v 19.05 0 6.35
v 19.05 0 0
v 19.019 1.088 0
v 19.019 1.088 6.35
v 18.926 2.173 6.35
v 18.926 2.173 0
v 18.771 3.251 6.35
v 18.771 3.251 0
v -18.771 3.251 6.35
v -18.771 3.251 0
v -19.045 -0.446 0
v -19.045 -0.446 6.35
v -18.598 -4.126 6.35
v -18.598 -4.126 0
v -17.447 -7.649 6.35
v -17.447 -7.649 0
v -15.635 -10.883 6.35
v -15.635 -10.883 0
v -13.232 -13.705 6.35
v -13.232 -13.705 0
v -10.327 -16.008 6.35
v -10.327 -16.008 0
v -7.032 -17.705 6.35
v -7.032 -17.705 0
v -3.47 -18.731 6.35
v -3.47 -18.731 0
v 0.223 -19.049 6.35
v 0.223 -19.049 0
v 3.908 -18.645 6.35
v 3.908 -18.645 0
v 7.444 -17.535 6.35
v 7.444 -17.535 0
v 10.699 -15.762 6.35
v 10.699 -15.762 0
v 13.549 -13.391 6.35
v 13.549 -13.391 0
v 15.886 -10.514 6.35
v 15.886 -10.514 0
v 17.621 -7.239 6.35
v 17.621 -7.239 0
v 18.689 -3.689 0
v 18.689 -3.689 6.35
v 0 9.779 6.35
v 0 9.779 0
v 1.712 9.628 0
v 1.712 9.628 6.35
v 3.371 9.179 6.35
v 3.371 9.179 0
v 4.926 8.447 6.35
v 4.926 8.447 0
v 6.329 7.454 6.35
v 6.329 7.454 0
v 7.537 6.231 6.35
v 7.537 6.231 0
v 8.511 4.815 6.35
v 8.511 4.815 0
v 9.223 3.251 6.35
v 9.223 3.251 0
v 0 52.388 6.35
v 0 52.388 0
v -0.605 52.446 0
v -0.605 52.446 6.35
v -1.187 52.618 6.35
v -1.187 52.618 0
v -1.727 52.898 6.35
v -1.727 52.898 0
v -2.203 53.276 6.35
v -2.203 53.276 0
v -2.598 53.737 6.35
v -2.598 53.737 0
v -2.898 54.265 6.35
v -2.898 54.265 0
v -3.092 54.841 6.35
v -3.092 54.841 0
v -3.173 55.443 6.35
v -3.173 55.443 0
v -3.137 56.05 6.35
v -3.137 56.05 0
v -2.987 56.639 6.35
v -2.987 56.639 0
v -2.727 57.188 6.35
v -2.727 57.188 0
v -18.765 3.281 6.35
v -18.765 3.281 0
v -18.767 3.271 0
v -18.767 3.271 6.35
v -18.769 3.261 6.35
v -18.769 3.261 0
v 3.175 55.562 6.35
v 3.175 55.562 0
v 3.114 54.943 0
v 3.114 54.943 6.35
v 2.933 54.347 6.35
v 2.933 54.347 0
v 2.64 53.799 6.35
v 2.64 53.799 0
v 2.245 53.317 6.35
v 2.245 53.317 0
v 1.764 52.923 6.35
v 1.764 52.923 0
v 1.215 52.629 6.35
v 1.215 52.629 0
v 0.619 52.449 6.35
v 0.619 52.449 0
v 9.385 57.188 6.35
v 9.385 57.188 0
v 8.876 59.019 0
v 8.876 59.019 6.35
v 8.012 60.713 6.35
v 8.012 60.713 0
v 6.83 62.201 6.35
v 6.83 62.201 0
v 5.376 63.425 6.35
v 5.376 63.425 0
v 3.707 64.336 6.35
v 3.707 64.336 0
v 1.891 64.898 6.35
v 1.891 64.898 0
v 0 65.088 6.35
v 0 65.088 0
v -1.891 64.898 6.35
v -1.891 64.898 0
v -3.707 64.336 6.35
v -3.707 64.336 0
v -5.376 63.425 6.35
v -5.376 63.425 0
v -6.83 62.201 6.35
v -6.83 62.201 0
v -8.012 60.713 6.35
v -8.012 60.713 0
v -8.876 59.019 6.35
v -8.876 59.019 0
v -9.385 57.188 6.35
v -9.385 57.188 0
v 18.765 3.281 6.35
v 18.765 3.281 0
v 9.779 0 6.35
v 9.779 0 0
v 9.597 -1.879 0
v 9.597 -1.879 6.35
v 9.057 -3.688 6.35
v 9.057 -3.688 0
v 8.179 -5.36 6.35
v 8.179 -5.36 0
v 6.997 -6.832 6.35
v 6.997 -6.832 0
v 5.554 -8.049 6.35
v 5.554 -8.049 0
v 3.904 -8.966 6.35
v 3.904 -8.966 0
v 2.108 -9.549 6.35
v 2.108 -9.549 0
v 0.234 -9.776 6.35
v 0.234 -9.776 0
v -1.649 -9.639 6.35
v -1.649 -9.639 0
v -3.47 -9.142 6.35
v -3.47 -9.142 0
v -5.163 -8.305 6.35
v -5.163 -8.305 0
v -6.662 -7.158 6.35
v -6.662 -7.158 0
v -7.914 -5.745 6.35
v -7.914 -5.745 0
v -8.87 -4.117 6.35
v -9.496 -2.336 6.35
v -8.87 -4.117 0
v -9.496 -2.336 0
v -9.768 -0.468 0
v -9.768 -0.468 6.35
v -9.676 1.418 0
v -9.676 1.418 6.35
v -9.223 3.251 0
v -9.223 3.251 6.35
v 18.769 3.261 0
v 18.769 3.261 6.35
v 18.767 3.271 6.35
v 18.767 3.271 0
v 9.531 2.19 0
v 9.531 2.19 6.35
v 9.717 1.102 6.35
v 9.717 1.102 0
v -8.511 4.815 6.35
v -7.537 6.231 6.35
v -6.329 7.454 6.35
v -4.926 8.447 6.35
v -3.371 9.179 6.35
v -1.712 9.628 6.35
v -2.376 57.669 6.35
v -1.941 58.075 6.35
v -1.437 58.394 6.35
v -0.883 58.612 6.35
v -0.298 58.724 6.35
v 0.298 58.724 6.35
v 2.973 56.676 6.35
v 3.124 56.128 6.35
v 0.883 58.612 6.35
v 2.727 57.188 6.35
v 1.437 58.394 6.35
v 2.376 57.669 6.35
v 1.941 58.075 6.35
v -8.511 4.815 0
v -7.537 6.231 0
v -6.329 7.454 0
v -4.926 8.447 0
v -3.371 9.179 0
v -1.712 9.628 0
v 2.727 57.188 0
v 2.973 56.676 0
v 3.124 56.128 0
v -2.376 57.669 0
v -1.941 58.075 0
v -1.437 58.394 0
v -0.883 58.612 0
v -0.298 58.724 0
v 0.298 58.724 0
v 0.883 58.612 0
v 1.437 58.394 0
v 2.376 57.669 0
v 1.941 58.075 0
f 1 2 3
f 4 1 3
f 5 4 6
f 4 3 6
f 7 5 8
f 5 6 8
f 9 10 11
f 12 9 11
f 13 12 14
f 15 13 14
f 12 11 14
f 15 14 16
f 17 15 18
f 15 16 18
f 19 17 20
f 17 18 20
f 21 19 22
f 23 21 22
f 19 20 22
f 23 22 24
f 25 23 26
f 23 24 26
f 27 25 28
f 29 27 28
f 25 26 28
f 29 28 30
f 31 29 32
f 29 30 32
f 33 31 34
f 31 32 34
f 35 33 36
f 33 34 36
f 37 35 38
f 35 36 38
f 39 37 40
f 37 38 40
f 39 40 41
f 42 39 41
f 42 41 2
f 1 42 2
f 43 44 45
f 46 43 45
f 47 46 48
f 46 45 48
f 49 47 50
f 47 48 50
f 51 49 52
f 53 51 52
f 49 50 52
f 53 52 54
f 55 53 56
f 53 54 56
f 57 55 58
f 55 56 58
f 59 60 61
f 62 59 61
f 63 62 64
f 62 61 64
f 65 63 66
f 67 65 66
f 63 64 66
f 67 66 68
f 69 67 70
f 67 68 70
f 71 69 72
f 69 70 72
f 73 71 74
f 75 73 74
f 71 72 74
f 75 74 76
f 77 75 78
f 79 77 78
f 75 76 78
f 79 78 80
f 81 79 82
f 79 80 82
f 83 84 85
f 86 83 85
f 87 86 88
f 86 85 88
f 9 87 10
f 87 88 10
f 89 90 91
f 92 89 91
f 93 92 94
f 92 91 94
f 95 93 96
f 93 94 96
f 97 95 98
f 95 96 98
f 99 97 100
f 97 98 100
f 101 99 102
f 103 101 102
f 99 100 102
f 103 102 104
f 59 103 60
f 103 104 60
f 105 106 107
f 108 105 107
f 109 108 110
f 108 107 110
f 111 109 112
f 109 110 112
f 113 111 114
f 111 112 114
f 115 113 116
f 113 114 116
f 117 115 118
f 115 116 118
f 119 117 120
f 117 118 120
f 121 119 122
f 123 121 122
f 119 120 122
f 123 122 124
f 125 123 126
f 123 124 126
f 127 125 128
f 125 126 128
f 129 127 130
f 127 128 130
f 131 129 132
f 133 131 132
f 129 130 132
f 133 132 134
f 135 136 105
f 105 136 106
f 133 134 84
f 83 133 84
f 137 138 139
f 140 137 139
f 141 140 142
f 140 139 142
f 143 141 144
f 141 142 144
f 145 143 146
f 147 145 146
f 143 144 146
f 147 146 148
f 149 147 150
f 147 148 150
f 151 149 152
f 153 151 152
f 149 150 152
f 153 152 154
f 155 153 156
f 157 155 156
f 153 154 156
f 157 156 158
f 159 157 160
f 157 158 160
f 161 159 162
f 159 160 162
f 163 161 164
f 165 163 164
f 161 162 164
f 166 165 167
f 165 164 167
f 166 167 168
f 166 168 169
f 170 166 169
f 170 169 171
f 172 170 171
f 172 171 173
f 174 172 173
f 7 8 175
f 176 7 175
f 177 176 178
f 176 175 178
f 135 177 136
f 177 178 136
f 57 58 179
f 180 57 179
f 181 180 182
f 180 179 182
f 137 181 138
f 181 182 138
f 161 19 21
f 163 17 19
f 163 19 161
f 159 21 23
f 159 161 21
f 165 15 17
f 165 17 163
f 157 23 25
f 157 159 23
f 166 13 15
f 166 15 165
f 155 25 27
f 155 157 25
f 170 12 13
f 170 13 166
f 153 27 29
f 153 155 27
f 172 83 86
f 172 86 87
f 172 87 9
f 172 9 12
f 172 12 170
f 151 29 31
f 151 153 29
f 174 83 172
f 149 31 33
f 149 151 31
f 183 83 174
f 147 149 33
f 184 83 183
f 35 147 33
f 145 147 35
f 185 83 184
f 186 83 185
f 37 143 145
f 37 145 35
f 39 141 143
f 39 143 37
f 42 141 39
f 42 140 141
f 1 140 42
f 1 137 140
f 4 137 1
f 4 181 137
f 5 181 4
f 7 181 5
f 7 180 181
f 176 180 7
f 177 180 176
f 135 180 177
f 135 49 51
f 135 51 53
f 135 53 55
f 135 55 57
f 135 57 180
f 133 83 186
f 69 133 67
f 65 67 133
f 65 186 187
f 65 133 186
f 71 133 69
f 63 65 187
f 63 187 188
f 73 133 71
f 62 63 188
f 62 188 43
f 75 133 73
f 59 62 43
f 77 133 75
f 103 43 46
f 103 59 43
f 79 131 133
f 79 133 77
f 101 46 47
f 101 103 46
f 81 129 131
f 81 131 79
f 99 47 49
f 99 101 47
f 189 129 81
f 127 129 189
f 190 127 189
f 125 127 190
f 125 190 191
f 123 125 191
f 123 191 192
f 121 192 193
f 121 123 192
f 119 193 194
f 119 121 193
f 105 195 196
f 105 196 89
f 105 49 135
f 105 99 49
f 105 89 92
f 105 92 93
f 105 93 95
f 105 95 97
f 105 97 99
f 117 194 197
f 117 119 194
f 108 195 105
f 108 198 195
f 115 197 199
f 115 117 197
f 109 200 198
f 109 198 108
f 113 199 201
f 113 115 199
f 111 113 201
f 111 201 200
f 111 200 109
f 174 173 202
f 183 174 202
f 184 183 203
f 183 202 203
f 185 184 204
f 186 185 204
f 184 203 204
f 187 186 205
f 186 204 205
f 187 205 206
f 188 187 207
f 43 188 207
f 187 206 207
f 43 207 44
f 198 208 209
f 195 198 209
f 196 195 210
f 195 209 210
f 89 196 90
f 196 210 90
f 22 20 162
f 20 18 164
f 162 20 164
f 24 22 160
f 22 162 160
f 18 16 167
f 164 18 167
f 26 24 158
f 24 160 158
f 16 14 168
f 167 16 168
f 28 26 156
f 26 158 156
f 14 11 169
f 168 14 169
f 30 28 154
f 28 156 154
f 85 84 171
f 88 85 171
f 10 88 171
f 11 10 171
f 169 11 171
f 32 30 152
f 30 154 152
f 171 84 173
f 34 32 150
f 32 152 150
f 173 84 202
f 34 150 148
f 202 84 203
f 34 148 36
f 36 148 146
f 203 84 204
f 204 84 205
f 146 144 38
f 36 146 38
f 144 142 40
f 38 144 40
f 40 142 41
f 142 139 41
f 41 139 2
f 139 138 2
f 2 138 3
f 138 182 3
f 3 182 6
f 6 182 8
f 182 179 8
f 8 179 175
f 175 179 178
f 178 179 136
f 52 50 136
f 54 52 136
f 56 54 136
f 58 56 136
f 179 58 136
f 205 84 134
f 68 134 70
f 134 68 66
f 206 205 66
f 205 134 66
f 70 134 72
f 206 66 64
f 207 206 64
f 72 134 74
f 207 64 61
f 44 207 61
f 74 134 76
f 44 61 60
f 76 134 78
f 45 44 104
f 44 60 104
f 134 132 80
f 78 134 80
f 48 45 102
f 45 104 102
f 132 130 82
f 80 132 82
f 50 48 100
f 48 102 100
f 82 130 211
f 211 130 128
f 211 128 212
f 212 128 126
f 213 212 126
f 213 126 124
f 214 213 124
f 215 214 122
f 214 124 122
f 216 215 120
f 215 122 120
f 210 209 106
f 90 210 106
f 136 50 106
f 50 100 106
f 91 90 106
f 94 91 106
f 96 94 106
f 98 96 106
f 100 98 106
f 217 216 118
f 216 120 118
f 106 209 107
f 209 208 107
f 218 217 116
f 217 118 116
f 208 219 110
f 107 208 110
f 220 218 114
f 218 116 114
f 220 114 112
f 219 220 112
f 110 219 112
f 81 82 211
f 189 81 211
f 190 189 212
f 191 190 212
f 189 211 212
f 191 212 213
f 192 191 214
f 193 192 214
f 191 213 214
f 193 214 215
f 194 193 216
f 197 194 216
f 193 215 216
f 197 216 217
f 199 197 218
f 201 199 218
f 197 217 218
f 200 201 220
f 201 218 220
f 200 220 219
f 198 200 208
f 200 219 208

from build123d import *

# Parameters (mm, degrees)
F1_DEPTH = 6.35


with BuildPart() as f1:
    # F0 (on Top) → F1 (new body)
    with BuildSketch(Plane.XY):
        with BuildLine():
            ThreePointArc((-18.7706, 3.2507038684), (-1.6313445375, -18.98002147), (19.05, 0))
            ThreePointArc((19.05, 0), (18.98002147, 1.6313445375), (18.7706, 3.2507038684))
            Line((18.7706, 3.2507038684), (9.222893546, 3.2507038684))
            ThreePointArc((9.222893546, 3.2507038684), (9.6389708213, 1.6489640709), (9.779, 0))
            ThreePointArc((9.779, 0), (-1.6489640709, -9.6389708213), (-9.222893546, 3.2507038684))
            Line((-9.222893546, 3.2507038684), (-18.7706, 3.2507038684))
        make_face()
        with BuildLine():
            Line((-9.3853, 57.1878519342), (-18.7706, 3.2507038684))
            ThreePointArc((-18.7706, 3.2507038684), (-12.2673671036, 14.5744366734), (0, 19.05))
            Line((0, 19.05), (0, 46.0375))
            ThreePointArc((0, 46.0375), (-7.2872183367, 49.4288164482), (-9.3853, 57.1878519342))
        make_face()
        with BuildLine():
            Line((9.222893546, 3.2507038684), (18.7706, 3.2507038684))
            ThreePointArc((18.7706, 3.2507038684), (12.2673671036, 14.5744366734), (0, 19.05))
            Line((0, 19.05), (0, 9.779))
            ThreePointArc((0, 9.779), (5.6497879549, 7.9817753078), (9.222893546, 3.2507038684))
        make_face()
        with BuildLine():
            ThreePointArc((0, 19.05), (12.2673671036, 14.5744366734), (18.7706, 3.2507038684))
            Line((18.7706, 3.2507038684), (9.3853, 57.1878519342))
            ThreePointArc((9.3853, 57.1878519342), (9.490010735, 56.3781722687), (9.525, 55.5625))
            ThreePointArc((9.525, 55.5625), (6.7351920908, 48.8273079092), (0, 46.0375))
            Line((0, 46.0375), (0, 19.05))
        make_face()
        with BuildLine():
            ThreePointArc((0, 19.05), (-12.2673671036, 14.5744366734), (-18.7706, 3.2507038684))
            Line((-18.7706, 3.2507038684), (-9.222893546, 3.2507038684))
            ThreePointArc((-9.222893546, 3.2507038684), (-5.6497879549, 7.9817753078), (0, 9.779))
            Line((0, 9.779), (0, 19.05))
        make_face()
        with BuildLine():
            Line((2.7274266425, 57.1878519342), (9.3853, 57.1878519342))
            ThreePointArc((9.3853, 57.1878519342), (0, 65.0875), (-9.3853, 57.1878519342))
            Line((-9.3853, 57.1878519342), (-2.7274266425, 57.1878519342))
            ThreePointArc((-2.7274266425, 57.1878519342), (0, 58.7375), (2.7274266425, 57.1878519342))
        make_face()
        with BuildLine():
            ThreePointArc((9.525, 55.5625), (9.490010735, 56.3781722687), (9.3853, 57.1878519342))
            Line((9.3853, 57.1878519342), (2.7274266425, 57.1878519342))
            ThreePointArc((2.7274266425, 57.1878519342), (3.0610622821, 56.4054250887), (3.175, 55.5625))
            ThreePointArc((3.175, 55.5625), (2.2450640303, 53.3174359697), (0, 52.3875))
            Line((0, 52.3875), (0, 46.0375))
            ThreePointArc((0, 46.0375), (6.7351920908, 48.8273079092), (9.525, 55.5625))
        make_face()
        with BuildLine():
            Line((-2.7274266425, 57.1878519342), (-9.3853, 57.1878519342))
            ThreePointArc((-9.3853, 57.1878519342), (-7.2872183367, 49.4288164482), (0, 46.0375))
            Line((0, 46.0375), (0, 52.3875))
            ThreePointArc((0, 52.3875), (-2.7605359435, 53.9940401489), (-2.7274266425, 57.1878519342))
        make_face()
    extrude(amount=F1_DEPTH)


solid = f1.part
